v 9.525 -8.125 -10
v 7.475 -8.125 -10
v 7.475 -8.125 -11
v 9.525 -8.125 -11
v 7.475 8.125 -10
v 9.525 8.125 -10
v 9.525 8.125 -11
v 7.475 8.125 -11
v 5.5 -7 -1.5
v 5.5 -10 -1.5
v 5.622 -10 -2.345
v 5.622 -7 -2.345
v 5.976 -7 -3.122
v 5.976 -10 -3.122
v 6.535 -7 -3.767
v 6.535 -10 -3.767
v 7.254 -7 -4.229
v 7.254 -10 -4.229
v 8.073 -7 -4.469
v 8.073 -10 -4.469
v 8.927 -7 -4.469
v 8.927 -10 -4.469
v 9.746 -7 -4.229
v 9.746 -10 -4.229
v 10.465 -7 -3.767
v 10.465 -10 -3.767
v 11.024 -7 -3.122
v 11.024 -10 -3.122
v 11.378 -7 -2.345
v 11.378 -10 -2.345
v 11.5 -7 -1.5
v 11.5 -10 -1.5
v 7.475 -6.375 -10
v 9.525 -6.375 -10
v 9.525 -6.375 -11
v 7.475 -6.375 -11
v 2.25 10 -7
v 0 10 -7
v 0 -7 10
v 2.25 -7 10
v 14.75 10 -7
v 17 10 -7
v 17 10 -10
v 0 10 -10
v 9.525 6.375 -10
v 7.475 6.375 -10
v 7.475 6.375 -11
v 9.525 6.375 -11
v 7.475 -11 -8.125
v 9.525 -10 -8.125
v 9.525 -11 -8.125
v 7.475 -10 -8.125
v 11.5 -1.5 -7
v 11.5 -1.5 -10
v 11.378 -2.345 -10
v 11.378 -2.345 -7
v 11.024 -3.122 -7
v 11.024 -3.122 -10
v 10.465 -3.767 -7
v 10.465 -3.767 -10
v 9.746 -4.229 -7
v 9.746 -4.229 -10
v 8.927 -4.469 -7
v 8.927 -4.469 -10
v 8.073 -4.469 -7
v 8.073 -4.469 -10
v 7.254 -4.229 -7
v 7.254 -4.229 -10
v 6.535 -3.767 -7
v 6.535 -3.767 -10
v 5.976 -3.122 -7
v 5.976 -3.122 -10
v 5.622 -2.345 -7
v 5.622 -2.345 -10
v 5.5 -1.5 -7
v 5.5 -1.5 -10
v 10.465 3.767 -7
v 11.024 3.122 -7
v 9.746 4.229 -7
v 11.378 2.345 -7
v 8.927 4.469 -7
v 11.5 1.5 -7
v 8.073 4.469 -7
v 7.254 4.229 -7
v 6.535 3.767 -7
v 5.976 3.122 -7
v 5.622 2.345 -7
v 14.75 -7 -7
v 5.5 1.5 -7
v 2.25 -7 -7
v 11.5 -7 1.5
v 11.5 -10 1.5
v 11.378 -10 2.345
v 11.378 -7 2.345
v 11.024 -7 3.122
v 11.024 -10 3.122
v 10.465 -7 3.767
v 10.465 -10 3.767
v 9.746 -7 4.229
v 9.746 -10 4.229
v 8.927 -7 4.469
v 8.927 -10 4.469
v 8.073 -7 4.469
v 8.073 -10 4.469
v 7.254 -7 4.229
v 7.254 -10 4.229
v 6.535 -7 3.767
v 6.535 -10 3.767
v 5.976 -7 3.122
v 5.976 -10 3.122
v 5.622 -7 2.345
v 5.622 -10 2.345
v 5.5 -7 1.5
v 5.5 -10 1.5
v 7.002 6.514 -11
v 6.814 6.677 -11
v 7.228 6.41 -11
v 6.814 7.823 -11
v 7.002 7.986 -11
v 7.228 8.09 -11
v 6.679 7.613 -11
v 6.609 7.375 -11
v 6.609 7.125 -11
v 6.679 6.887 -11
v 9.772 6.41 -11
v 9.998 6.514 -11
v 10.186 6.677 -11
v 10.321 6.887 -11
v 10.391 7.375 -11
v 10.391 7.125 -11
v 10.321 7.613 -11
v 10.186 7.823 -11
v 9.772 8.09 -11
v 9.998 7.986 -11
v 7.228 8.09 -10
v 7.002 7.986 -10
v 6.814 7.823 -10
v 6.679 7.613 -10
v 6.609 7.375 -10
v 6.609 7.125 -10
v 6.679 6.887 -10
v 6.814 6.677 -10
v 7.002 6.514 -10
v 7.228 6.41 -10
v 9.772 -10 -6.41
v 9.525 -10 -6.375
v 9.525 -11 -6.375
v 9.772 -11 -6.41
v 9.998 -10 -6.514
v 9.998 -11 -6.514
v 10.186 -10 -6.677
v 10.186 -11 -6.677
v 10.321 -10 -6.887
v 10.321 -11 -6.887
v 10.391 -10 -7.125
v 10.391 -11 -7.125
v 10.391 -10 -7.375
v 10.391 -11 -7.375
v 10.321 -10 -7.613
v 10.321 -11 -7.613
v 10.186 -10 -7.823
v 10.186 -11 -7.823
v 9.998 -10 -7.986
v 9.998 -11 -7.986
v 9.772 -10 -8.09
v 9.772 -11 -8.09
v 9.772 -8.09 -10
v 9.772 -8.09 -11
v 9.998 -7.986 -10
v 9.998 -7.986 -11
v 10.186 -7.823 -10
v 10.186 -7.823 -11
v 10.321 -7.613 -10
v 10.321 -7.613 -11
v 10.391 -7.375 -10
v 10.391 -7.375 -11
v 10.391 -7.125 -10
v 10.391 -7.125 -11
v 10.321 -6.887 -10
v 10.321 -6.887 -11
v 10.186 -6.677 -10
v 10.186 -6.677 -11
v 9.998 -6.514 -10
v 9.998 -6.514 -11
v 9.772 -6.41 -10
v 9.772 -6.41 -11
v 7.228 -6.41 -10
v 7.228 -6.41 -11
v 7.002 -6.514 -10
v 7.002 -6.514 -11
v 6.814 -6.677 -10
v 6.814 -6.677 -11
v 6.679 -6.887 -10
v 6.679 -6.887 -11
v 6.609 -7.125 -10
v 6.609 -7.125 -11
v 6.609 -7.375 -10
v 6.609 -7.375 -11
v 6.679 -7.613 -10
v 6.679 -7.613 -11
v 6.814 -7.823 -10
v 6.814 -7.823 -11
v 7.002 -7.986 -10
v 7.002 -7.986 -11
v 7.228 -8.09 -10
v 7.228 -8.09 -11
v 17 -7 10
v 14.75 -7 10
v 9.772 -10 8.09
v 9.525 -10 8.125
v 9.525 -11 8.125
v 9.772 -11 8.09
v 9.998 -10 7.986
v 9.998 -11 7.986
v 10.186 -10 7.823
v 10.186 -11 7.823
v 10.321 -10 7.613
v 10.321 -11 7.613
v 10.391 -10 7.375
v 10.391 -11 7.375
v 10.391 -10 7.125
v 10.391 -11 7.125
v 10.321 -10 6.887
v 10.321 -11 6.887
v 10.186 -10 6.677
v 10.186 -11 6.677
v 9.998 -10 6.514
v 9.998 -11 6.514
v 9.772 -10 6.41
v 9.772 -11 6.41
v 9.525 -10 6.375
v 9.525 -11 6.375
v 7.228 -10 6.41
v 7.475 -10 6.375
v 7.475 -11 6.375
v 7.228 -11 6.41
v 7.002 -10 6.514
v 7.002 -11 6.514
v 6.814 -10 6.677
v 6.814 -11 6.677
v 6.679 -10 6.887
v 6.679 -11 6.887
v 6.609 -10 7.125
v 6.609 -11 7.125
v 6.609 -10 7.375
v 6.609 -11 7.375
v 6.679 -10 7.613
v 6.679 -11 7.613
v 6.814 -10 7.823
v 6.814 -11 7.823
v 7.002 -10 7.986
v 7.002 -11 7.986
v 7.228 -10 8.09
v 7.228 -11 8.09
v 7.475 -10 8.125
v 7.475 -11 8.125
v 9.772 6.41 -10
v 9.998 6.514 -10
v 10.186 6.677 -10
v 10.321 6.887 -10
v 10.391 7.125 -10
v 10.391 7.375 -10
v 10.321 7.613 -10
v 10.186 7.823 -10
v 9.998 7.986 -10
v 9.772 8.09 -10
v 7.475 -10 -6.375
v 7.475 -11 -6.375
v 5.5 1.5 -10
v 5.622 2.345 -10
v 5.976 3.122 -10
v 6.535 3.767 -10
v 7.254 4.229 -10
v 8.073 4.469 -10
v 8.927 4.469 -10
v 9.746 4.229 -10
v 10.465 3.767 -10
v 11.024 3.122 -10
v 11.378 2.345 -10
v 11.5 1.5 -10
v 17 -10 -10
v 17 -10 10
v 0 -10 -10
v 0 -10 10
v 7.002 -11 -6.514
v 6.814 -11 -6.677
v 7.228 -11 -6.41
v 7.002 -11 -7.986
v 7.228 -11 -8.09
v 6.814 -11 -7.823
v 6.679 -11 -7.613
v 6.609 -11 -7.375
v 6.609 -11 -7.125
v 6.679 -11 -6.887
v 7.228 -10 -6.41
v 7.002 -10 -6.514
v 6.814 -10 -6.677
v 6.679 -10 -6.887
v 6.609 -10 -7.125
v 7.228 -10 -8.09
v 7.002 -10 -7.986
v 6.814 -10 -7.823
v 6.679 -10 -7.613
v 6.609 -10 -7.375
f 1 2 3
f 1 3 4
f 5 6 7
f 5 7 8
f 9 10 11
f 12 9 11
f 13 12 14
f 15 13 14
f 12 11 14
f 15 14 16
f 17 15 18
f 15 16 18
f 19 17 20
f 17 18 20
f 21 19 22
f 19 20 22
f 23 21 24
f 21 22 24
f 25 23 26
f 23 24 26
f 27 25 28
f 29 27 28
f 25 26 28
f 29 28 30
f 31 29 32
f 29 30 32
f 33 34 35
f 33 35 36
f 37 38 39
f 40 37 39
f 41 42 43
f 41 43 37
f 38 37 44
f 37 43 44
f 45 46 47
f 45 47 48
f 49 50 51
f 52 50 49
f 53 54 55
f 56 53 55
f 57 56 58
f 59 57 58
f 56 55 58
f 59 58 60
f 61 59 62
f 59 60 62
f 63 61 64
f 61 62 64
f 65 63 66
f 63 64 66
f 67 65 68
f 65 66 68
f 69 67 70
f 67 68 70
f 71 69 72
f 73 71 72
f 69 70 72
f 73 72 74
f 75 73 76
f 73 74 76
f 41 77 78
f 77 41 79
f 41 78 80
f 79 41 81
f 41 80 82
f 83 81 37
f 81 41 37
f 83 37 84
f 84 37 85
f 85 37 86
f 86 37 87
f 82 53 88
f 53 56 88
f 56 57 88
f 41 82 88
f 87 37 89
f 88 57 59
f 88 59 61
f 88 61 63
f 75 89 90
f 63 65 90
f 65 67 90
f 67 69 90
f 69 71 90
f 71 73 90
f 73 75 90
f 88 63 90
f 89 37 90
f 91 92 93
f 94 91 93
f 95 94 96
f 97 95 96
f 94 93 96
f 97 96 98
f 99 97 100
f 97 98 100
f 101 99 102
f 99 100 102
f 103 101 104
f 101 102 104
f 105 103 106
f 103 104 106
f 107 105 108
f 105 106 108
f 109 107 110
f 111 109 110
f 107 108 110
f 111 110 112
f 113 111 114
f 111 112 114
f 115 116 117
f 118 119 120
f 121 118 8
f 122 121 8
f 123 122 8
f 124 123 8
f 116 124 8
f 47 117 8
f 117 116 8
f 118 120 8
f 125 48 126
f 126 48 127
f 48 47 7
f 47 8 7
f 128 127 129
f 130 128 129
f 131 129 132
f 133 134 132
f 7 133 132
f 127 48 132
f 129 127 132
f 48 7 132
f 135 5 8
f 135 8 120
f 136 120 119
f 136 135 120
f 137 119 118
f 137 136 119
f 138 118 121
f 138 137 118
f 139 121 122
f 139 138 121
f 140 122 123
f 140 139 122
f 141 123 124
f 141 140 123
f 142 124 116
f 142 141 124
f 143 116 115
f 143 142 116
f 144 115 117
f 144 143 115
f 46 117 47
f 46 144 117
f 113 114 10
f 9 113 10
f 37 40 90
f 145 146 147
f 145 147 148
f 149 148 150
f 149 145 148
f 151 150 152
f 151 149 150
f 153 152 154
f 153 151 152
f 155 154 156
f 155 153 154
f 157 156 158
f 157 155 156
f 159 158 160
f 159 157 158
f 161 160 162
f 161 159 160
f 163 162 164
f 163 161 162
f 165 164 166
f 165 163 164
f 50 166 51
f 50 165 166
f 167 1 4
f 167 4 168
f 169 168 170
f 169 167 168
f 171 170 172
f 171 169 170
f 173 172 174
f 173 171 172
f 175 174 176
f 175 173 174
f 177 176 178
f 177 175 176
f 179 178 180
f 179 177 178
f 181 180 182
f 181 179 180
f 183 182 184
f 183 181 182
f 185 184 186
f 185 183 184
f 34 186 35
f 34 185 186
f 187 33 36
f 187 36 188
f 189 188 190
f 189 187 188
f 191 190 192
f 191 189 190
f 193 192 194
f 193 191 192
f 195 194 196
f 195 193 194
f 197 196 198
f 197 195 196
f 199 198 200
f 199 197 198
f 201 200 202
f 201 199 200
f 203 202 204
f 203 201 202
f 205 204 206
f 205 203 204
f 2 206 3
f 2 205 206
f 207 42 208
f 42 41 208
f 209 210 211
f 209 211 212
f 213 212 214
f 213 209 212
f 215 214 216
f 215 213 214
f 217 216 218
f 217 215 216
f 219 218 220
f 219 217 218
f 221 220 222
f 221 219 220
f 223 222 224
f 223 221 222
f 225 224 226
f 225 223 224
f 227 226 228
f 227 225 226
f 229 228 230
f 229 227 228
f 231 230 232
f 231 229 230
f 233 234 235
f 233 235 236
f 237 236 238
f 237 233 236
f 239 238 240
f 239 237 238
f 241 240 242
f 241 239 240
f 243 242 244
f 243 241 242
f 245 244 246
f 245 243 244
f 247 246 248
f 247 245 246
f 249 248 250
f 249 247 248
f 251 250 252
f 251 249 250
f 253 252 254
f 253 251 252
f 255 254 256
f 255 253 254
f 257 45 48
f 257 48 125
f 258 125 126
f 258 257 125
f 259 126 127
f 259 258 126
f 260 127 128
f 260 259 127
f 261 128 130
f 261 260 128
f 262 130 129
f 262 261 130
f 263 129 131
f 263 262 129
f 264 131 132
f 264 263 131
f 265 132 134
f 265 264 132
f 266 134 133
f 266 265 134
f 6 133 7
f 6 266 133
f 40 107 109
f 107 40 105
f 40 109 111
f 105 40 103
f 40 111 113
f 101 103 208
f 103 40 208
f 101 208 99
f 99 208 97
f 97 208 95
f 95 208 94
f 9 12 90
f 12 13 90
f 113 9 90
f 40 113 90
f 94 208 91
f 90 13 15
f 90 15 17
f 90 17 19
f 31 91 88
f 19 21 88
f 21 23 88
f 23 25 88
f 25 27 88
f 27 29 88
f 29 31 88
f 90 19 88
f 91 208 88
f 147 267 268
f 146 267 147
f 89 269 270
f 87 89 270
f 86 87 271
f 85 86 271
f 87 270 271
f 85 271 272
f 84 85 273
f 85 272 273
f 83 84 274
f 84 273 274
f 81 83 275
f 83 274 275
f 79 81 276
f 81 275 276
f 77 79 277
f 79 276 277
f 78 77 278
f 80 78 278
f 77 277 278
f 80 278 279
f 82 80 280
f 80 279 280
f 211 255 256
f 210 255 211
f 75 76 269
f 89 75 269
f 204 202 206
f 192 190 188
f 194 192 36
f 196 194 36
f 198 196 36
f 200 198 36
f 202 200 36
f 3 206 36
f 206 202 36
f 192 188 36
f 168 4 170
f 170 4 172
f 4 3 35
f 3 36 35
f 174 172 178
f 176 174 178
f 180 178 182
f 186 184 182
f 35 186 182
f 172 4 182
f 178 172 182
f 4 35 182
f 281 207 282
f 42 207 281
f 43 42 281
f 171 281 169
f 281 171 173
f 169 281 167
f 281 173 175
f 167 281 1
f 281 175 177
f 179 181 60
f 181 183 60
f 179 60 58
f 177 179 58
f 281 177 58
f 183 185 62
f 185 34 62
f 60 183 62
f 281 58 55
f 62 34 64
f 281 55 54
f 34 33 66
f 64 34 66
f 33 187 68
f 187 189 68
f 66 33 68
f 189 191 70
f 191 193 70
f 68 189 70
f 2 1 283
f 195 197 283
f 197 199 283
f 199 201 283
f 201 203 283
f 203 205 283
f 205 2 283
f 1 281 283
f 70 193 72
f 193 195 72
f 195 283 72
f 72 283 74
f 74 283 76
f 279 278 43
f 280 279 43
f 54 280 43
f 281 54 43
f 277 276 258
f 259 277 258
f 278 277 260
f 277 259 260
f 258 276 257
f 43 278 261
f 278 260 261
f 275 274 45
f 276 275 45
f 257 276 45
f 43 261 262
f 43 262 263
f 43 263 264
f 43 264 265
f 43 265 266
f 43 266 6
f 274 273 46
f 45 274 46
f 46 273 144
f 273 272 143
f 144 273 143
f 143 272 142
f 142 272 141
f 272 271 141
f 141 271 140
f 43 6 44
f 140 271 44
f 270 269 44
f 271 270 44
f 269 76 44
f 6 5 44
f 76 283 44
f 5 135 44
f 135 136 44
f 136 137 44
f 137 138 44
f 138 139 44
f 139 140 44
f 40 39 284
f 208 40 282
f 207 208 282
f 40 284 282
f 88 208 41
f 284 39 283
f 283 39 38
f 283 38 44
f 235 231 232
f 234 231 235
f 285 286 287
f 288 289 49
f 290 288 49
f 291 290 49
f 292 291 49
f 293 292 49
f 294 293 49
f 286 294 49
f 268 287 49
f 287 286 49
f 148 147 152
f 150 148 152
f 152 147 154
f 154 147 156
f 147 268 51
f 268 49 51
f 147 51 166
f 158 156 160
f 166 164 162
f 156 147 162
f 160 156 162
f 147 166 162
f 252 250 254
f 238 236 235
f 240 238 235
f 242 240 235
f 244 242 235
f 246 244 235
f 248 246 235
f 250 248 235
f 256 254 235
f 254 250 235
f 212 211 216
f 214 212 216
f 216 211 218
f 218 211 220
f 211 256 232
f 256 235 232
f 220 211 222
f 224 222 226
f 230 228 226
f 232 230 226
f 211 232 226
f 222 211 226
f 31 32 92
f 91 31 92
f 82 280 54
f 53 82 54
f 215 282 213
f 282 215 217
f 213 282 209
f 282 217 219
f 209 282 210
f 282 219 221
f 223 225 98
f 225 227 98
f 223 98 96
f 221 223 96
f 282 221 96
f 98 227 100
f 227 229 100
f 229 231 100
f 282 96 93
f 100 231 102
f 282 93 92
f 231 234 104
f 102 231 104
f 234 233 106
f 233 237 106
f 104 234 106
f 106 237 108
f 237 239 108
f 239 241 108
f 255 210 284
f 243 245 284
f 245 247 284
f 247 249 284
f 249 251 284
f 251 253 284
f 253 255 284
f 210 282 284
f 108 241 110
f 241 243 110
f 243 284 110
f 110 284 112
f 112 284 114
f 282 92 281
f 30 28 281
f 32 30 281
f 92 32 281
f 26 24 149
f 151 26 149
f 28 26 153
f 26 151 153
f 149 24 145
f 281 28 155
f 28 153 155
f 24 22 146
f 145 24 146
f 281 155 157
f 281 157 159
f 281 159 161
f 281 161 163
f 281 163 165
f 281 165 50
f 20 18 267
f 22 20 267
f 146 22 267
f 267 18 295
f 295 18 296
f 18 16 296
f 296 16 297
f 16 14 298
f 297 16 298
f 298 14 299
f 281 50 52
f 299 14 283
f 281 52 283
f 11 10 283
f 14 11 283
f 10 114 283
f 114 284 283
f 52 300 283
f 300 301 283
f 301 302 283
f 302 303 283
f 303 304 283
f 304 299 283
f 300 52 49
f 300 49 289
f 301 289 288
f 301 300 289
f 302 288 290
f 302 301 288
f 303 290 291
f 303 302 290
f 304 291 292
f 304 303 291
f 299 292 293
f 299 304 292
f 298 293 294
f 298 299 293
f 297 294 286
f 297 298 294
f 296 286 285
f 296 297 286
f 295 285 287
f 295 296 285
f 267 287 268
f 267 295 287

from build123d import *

# Parameters (mm, degrees)
BOSS_EXTRUDE3_DEPTH       = 17
SHELL4_T                  = -2.25
SHELL4_THICKNESS_2_FACE_W = 17.75
SHELL4_THICKNESS_2_FACE_H = 12.5
SHELL4_THICKNESS_2_DEPTH  = 0.75
SHELL4_THICKNESS_3_FACE_W = 17
SHELL4_THICKNESS_3_FACE_H = 12.5
SHELL4_THICKNESS_3_DEPTH  = 0.75
CUT_EXTRUDE1_DEPTH        = 29.08914381
CUT_EXTRUDE2_DEPTH        = 29.08914381
BOSS_EXTRUDE4_DEPTH       = 1
BOSS_EXTRUDE5_DEPTH       = 1
BOSS_EXTRUDE6_DEPTH       = 1
BOSS_EXTRUDE7_DEPTH       = 1


with BuildPart() as part:
    # Sketch4 → Boss-Extrude3 (new body)
    with BuildSketch(Plane(origin=(0, 0, 0), x_dir=(0, 0, -1), z_dir=(1, 0, 0))):
        Polygon((7, 10), (-10, -7), (-10, -10), (10, -10), (10, 10), align=None)
    extrude(amount=BOSS_EXTRUDE3_DEPTH)

    # Shell4
    shell4_openings = [part.faces().sort_by_distance(p)[0] for p in [
        (8.5, 10, -8.5),
        (8.5, -8.5, 10),
        (8.5, 1.5, 1.5),
    ]]
    offset(amount=SHELL4_T, openings=shell4_openings, kind=Kind.INTERSECTION)

    # Shell4 thickness 2 face (on inner face of the shell) → Shell4 thickness 2 (add)
    with BuildSketch(Plane(origin=(8.5, -7.75, 1.125), x_dir=(0, 0, -1), z_dir=(0, -1, 0))):
        Rectangle(SHELL4_THICKNESS_2_FACE_W, SHELL4_THICKNESS_2_FACE_H)
    extrude(amount=-SHELL4_THICKNESS_2_DEPTH)

    # Shell4 thickness 3 face (on inner face of the shell) → Shell4 thickness 3 (add)
    with BuildSketch(Plane(origin=(8.5, 1.5, -7.75), x_dir=(0, -1, 0), z_dir=(0, 0, -1))):
        Rectangle(SHELL4_THICKNESS_3_FACE_W, SHELL4_THICKNESS_3_FACE_H)
    extrude(amount=-SHELL4_THICKNESS_3_DEPTH)

    # Sketch5 → Cut-Extrude1 (cut, through all)
    with BuildSketch(Plane(origin=(0, 0, -10), x_dir=(-1, 0, 0), z_dir=(0, 0, -1))):
        with BuildLine():
            Line((-11.5, 1.5), (-11.5, -1.5))
            ThreePointArc((-11.5, -1.5), (-8.5, -4.5), (-5.5, -1.5))
            Line((-5.5, -1.5), (-5.5, 1.5))
            ThreePointArc((-5.5, 1.5), (-8.5, 4.5), (-11.5, 1.5))
        make_face()
    extrude(amount=-CUT_EXTRUDE1_DEPTH, mode=Mode.SUBTRACT)

    # Sketch8 → Cut-Extrude2 (cut, through all)
    with BuildSketch(Plane(origin=(0, -10, 0), x_dir=(-1, 0, 0), z_dir=(0, -1, 0))):
        with BuildLine():
            Line((-11.5, 1.5), (-11.5, -1.5))
            ThreePointArc((-11.5, -1.5), (-8.5, -4.5), (-5.5, -1.5))
            Line((-5.5, -1.5), (-5.5, 1.5))
            ThreePointArc((-5.5, 1.5), (-8.5, 4.5), (-11.5, 1.5))
        make_face()
    extrude(amount=-CUT_EXTRUDE2_DEPTH, mode=Mode.SUBTRACT)

    # Sketch9 → Boss-Extrude4 (add)
    with BuildSketch(Plane(origin=(0, 0, -10), x_dir=(-1, 0, 0), z_dir=(0, 0, -1))):
        with BuildLine():
            Line((-9.525, 8.125), (-7.475, 8.125))
            ThreePointArc((-7.475, 8.125), (-6.6, 7.25), (-7.475, 6.375))
            Line((-7.475, 6.375), (-9.525, 6.375))
            ThreePointArc((-9.525, 6.375), (-10.4, 7.25), (-9.525, 8.125))
        make_face()
    extrude(amount=BOSS_EXTRUDE4_DEPTH)

    # Sketch10 → Boss-Extrude5 (add)
    with BuildSketch(Plane(origin=(0, 0, -10), x_dir=(-1, 0, 0), z_dir=(0, 0, -1))):
        with BuildLine():
            Line((-9.525, -6.375), (-7.475, -6.375))
            ThreePointArc((-7.475, -6.375), (-6.6, -7.25), (-7.475, -8.125))
            Line((-7.475, -8.125), (-9.525, -8.125))
            ThreePointArc((-9.525, -8.125), (-10.4, -7.25), (-9.525, -6.375))
        make_face()
    extrude(amount=BOSS_EXTRUDE5_DEPTH)

    # Sketch12 → Boss-Extrude6 (add)
    with BuildSketch(Plane(origin=(-0.843813019, -10, -7.7592784), x_dir=(-1, 0, 0), z_dir=(0, -1, 0))):
        with BuildLine():
            Line((-10.368813019, 0.3657216), (-8.318813019, 0.3657216))
            ThreePointArc((-8.318813019, 0.3657216), (-7.443813019, -0.5092784), (-8.318813019, -1.3842784))
            Line((-8.318813019, -1.3842784), (-10.368813019, -1.3842784))
            ThreePointArc((-10.368813019, -1.3842784), (-11.243813019, -0.5092784), (-10.368813019, 0.3657216))
        make_face()
    extrude(amount=BOSS_EXTRUDE6_DEPTH)

    # Sketch14 → Boss-Extrude7 (add)
    with BuildSketch(Plane(origin=(-0.843813019, -10, -7.7592784), x_dir=(-1, 0, 0), z_dir=(0, -1, 0))):
        with BuildLine():
            Line((-10.368813019, -14.1342784), (-8.318813019, -14.1342784))
            ThreePointArc((-8.318813019, -14.1342784), (-7.443813019, -15.0092784), (-8.318813019, -15.8842784))
            Line((-8.318813019, -15.8842784), (-10.368813019, -15.8842784))
            ThreePointArc((-10.368813019, -15.8842784), (-11.243813019, -15.0092784), (-10.368813019, -14.1342784))
        make_face()
    extrude(amount=BOSS_EXTRUDE7_DEPTH)


solid = part.part
